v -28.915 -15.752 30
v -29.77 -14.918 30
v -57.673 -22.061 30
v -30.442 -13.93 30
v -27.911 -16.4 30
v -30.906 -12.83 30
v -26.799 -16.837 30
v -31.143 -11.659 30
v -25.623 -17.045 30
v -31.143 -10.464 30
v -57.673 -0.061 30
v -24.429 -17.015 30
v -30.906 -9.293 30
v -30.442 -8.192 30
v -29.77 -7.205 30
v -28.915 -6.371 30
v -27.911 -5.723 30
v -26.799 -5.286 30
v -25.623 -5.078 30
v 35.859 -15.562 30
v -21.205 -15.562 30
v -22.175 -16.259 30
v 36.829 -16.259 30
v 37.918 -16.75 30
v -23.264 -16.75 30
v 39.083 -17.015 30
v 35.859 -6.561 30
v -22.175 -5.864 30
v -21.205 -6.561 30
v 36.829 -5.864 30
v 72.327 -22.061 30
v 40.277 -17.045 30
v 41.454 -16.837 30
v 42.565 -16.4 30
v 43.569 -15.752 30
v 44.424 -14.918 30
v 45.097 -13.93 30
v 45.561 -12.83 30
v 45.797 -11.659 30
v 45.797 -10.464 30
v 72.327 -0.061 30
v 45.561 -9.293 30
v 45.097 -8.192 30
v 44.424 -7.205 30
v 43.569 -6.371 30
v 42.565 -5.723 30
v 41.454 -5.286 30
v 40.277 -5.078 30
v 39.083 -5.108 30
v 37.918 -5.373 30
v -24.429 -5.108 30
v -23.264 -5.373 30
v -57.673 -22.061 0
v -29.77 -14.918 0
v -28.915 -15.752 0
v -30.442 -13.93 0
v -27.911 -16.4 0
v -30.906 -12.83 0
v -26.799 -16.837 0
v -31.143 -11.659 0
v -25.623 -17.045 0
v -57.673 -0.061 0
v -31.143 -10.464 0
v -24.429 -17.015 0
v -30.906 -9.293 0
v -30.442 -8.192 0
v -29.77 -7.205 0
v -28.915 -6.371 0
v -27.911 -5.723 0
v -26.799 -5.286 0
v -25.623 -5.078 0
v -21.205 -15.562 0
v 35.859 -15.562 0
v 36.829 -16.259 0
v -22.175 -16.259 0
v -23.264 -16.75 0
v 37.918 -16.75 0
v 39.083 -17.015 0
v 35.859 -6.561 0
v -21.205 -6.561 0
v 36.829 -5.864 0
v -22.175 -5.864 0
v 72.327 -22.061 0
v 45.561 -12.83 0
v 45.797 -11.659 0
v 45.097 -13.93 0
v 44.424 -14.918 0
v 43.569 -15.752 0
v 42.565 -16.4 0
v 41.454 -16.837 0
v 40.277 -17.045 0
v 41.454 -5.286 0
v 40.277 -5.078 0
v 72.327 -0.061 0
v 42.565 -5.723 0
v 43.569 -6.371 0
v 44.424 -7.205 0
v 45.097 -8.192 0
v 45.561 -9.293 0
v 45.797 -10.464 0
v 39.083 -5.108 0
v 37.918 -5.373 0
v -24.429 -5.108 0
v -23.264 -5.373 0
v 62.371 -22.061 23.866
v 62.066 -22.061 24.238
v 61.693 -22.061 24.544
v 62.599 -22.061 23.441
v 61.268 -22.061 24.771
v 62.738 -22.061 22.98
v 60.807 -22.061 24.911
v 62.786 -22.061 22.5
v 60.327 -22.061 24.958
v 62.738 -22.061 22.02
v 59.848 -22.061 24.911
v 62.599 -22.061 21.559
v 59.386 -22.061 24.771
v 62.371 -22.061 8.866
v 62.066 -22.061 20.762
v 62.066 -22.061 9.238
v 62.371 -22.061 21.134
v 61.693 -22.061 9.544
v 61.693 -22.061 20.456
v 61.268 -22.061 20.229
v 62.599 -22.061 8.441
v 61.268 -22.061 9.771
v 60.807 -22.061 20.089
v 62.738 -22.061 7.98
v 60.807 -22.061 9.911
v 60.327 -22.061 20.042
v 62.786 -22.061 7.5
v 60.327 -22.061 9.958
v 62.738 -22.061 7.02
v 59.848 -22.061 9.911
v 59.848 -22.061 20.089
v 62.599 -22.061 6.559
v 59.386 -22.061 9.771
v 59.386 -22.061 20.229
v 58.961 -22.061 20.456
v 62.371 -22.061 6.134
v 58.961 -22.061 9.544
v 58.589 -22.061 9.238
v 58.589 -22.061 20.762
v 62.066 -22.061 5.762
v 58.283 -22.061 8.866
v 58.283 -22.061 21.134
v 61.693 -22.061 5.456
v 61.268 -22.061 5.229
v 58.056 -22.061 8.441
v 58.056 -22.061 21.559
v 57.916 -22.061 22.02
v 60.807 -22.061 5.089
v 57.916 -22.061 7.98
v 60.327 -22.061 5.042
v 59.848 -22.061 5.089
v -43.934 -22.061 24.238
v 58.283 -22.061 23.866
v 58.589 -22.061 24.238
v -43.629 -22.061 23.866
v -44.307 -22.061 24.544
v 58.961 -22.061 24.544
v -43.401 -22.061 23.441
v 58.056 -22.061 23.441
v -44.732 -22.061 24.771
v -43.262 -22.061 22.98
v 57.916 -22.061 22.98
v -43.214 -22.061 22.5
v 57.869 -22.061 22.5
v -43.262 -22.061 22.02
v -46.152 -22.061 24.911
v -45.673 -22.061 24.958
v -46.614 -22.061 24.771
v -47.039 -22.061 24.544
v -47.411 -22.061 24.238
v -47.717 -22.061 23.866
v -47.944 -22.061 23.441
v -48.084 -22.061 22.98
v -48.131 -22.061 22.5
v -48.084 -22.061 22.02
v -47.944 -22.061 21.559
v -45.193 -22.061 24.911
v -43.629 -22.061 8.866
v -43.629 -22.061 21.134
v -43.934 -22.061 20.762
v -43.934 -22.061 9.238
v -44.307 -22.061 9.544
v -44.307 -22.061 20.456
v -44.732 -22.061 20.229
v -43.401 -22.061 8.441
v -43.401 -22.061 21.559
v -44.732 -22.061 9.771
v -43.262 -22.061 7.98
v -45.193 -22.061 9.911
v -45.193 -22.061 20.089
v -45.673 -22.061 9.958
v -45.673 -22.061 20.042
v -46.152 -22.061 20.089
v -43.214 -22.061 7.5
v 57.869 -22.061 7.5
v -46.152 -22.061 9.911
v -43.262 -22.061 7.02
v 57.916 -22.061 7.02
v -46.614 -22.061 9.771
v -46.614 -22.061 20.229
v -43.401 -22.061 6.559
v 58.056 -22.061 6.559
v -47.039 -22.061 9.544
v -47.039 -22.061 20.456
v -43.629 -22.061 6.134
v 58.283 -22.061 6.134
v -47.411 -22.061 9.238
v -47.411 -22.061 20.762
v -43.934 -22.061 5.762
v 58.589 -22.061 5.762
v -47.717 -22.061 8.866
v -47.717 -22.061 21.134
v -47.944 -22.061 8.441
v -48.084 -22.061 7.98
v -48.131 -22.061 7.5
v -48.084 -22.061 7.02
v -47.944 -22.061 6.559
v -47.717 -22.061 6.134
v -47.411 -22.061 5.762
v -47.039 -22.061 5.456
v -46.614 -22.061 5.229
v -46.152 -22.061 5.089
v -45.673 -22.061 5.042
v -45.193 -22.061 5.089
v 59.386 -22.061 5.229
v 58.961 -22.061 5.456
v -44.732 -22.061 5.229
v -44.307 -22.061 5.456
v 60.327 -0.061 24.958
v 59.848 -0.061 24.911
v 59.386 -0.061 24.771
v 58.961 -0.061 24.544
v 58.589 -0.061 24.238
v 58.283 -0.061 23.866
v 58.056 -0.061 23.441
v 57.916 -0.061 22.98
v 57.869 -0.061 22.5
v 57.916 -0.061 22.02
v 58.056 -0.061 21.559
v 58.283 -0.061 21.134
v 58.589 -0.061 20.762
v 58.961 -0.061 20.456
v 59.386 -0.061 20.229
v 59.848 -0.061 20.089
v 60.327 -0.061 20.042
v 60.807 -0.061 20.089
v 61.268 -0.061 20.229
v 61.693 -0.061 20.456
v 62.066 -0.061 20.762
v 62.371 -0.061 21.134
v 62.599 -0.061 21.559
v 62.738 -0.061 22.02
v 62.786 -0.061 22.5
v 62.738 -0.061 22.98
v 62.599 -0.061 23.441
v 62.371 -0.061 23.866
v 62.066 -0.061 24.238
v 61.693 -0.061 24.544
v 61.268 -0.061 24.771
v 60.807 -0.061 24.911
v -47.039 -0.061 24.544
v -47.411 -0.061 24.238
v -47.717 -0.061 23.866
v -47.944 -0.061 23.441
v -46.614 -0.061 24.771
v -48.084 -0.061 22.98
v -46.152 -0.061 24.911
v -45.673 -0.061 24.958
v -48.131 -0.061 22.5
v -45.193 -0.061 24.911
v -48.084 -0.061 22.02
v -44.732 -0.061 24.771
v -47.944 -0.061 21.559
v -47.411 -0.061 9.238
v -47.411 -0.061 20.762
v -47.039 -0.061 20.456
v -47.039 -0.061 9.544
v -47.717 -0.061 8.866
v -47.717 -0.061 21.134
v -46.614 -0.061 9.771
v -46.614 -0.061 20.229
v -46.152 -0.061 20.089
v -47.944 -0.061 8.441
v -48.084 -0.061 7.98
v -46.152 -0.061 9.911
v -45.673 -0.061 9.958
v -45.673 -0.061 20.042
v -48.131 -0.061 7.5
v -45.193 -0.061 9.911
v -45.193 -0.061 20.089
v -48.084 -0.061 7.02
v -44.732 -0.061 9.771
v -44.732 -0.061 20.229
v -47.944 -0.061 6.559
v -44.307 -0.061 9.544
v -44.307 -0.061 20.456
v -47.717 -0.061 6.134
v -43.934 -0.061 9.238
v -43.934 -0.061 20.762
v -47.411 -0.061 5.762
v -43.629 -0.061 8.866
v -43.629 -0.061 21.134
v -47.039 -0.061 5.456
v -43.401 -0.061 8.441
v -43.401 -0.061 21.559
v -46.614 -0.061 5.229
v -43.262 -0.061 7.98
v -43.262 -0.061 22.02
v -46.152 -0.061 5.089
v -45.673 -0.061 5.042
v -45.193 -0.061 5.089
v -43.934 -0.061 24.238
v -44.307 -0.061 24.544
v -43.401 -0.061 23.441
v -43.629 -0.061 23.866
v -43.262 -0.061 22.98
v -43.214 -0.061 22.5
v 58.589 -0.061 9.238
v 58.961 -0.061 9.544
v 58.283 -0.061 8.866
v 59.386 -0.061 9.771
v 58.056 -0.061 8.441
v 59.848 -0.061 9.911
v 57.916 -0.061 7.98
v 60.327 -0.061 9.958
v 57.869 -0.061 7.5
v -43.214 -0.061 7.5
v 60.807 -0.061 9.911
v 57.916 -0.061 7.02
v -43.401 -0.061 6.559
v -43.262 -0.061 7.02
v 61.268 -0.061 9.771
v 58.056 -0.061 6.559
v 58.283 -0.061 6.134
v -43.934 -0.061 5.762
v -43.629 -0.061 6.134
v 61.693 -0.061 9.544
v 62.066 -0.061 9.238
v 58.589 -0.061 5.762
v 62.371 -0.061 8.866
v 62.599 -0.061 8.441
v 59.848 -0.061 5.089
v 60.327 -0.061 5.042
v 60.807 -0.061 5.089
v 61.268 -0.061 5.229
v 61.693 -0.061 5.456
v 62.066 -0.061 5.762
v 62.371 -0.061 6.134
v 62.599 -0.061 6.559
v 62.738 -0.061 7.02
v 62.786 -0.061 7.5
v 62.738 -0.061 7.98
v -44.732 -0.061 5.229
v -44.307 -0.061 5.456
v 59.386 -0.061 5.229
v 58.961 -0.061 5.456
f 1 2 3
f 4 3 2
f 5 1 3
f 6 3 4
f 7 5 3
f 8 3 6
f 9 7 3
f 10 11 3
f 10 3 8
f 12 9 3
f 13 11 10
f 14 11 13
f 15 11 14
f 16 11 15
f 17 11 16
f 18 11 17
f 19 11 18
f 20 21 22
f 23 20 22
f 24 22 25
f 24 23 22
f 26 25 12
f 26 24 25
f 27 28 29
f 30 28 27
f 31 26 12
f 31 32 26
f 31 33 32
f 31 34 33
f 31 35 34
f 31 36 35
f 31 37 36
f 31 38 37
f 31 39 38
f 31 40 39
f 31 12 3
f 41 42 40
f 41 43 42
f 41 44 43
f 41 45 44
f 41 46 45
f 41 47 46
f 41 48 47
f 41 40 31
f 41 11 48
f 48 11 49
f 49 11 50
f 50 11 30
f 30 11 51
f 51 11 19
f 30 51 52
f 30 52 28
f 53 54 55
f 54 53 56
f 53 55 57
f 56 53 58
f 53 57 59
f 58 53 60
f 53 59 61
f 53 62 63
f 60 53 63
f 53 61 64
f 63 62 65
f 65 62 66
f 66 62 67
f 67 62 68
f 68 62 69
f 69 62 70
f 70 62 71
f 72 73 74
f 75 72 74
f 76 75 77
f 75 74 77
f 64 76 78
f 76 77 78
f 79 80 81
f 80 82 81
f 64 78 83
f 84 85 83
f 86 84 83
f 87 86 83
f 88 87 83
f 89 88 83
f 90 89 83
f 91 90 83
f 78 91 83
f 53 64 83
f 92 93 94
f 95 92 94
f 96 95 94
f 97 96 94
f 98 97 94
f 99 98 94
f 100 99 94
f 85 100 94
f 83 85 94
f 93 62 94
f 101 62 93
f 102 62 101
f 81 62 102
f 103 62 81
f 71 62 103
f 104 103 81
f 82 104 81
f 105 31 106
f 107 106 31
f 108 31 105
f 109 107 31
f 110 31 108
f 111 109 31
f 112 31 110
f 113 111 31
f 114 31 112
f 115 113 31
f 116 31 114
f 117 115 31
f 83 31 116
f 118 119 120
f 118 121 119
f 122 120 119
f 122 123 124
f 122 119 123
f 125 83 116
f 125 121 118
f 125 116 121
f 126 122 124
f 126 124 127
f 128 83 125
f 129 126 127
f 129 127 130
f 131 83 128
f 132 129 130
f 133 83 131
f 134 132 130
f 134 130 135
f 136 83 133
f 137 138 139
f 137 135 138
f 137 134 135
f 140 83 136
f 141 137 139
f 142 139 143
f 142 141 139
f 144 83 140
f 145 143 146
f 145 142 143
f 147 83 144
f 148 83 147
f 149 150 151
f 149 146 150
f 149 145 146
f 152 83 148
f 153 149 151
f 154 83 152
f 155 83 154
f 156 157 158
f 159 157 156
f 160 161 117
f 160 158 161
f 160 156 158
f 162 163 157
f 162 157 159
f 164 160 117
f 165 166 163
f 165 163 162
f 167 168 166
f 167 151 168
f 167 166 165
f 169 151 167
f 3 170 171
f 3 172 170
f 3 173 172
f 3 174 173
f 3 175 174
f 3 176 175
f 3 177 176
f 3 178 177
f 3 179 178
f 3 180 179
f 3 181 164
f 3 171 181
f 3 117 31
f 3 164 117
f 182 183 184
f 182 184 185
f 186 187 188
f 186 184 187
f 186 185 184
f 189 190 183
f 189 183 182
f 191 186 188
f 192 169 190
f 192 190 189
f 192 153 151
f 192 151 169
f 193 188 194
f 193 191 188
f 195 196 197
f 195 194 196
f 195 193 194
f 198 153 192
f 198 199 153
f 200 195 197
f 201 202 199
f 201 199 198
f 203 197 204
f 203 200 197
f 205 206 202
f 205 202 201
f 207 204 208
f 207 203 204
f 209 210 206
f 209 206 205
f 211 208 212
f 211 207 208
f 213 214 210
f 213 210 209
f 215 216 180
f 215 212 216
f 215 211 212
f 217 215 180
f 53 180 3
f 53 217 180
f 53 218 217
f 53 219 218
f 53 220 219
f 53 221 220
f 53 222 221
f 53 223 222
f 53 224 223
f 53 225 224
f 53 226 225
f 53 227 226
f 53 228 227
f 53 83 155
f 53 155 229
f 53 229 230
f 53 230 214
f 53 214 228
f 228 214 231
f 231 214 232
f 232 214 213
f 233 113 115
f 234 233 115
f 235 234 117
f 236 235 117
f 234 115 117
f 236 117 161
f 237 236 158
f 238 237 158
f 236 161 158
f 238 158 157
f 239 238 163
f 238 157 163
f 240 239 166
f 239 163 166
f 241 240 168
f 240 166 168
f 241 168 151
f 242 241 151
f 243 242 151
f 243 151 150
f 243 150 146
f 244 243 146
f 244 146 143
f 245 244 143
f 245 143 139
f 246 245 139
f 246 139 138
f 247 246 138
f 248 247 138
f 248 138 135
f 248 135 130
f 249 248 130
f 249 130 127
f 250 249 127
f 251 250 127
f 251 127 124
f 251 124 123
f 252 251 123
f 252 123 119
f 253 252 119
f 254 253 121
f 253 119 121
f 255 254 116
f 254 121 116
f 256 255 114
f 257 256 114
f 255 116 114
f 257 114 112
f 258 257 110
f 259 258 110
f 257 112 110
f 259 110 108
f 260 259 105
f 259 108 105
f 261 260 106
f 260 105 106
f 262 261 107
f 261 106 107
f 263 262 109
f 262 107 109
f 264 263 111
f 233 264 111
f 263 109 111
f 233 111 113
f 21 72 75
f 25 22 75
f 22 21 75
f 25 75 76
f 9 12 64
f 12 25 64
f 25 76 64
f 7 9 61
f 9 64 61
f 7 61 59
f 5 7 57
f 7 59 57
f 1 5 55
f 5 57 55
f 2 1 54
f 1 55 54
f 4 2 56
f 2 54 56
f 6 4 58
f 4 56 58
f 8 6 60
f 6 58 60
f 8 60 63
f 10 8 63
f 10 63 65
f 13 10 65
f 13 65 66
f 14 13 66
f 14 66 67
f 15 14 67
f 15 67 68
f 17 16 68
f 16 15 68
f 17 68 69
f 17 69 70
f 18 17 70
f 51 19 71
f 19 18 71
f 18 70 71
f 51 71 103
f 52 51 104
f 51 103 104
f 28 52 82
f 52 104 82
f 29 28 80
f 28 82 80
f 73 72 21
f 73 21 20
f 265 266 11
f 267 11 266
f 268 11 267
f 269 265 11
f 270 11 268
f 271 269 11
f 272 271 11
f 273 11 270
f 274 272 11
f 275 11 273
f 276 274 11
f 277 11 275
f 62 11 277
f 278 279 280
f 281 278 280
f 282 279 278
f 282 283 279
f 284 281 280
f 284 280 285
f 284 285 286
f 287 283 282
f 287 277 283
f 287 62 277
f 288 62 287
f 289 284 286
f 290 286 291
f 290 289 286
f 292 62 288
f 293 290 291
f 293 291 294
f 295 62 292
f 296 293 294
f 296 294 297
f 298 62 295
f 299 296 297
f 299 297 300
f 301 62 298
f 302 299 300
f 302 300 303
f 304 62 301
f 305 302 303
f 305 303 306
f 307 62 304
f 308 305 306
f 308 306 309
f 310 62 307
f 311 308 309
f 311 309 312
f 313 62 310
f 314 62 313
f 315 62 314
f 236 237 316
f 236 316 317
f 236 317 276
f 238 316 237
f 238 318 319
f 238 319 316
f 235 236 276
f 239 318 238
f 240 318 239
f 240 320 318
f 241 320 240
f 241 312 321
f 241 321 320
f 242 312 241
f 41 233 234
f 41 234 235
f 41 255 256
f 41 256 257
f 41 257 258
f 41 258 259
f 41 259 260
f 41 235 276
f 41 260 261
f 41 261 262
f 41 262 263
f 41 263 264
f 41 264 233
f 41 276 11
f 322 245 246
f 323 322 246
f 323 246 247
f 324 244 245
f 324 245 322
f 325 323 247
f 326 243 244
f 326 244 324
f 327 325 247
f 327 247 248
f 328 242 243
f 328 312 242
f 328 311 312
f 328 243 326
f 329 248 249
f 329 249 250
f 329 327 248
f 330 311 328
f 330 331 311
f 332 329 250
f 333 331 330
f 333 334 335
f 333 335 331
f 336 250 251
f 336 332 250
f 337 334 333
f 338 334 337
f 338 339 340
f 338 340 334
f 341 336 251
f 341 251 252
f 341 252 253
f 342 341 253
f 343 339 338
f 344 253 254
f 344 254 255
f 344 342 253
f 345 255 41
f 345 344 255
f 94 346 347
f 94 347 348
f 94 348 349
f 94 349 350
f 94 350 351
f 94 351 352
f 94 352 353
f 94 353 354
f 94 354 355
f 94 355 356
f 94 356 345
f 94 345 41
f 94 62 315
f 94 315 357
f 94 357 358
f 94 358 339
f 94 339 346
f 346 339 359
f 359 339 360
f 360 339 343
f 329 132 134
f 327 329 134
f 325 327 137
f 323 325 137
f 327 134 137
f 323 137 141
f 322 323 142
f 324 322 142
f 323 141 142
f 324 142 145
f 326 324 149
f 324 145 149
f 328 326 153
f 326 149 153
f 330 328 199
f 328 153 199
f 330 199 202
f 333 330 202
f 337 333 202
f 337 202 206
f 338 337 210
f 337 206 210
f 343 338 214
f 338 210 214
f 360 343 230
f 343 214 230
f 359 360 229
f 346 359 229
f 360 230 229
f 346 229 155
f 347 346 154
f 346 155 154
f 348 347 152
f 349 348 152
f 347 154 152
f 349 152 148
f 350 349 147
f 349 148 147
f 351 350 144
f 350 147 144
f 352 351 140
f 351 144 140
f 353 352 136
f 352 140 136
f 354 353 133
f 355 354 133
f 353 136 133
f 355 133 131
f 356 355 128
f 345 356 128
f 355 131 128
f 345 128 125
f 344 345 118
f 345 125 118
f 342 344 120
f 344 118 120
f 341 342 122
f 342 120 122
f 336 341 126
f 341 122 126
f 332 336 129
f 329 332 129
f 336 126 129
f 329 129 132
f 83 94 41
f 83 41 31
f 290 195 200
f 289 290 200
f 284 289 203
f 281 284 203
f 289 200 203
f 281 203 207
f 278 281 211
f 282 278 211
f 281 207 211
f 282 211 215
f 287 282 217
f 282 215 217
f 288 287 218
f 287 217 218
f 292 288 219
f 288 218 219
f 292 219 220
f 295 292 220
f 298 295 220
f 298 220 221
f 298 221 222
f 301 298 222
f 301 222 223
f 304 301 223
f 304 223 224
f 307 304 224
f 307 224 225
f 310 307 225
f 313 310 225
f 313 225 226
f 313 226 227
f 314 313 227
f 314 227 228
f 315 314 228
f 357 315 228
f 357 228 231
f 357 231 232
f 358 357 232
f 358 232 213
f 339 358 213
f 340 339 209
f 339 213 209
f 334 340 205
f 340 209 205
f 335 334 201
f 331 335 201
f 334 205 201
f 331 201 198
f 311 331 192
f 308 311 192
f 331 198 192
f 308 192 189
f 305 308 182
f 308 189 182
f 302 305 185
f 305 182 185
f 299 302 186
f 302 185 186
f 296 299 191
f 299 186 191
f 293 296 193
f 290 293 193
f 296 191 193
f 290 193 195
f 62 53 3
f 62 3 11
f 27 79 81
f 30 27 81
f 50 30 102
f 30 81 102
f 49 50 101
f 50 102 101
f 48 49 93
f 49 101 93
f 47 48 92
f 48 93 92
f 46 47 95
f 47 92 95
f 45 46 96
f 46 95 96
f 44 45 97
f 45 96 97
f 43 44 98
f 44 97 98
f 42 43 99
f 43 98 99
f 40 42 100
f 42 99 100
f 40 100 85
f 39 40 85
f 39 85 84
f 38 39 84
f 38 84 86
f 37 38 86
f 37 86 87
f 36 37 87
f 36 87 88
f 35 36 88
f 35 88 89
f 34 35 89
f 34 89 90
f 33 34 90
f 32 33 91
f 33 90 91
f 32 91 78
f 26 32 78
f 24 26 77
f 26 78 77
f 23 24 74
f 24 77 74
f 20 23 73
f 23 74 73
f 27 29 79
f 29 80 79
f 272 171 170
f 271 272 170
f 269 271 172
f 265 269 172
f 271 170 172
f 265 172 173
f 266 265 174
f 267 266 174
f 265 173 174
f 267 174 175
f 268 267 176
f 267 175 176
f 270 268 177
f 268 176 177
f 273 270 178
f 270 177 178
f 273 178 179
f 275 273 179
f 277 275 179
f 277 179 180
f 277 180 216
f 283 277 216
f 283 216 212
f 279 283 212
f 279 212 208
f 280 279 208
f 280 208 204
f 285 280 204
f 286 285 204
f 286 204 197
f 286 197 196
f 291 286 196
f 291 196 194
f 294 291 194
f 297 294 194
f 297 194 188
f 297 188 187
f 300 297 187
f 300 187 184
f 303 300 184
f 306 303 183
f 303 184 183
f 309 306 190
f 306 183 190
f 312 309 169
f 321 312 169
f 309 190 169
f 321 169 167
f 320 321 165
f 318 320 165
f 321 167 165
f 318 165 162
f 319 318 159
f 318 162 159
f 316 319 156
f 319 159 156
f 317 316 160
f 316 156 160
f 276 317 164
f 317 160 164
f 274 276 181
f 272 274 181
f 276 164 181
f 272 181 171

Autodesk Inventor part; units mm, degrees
ref_plane "YZ Plane" through (0, 0, 0) normal (1, 0, 0) x (0, 1, 0)
ref_plane "XZ Plane" through (0, 0, 0) normal (0, 1, 0) x (-1, 0, 0)
ref_plane "XY Plane" through (0, 0, 0) normal (0, 0, 1) x (1, 0, 0)
sketch "スケッチ1" plane through (0, 0, 0) normal (0, 0, 1) x (1, 0, 0)
  line L0 (-57.6728, -0.0614) -> (72.3272, -0.0614)
  line L1 (72.3272, -0.0614) -> (72.3272, -22.0614)
  line L2 (72.3272, -22.0614) -> (-57.6728, -22.0614)
  line L3 (-57.6728, -22.0614) -> (-57.6728, -0.0614)
  circle A0 centre (-25.1728, -11.0614) radius 6
  circle A1 centre (39.8272, -11.0614) radius 6
  line L4 (-21.2046, -6.5611) -> (35.8589, -6.5611)
  line L5 (-21.2046, -15.5617) -> (35.8589, -15.5617)
  point P0 (0, 0)
  dimension "d0" = 130
  dimension "d1" = 22
  dimension "d4" = 12
  dimension "d5" = 12
  dimension "d6" = 65
  dimension "d7" = 11
  dimension "d8" = 11
  dimension "d9" = 32.5
extrude "押し出し1" add sketch "スケッチ1" along normal blind 30 contours L0 L1 L2 L3 | A0 | A0 L4 A1 L5 | A1
extrude "押し出し2" cut sketch "スケッチ1" along normal blind 30 contours A0 | A0 L4 A1 L5 | A1
sketch "スケッチ2" plane through (-57.6728, -0.0614, 0) normal (0, 1, 0) x (1, 0, 0)
  circle A0 centre (12, -7.5) radius 3
  line L0 (65, -1.1982) -> (65, -25.359)
  line L1 (8.4096, -15) -> (24.5168, -15)
  line L2 (130, 0) -> (130, -30) projected
  line L3 (0, 0) -> (130, 0) projected
  line L4 (0, 0) -> (0, -30) projected
  circle A1 centre (12, -22.5) radius 3
  circle A2 centre (118, -7.5) radius 3
  circle A3 centre (118, -22.5) radius 3
  point P0 (57.6728, 0)
  dimension "d12" = 6
  dimension "d13" = 65
  dimension "d14" = 15
  dimension "d15" = 12
  dimension "d16" = 7.5
hole "穴1" at (-45.6728, -0.0614, 7.5) at (-45.6728, -0.0614, 22.5) at (60.3272, -0.0614, 7.5) at (60.3272, -0.0614, 22.5) direction (0, -1, 0) diameter 4.917 end through all thread size "M6x1" class "6H" standard "ANSI Metric M Profile"
properties part number "sc601_load_cell" material "アルミニウム 6061-O"
